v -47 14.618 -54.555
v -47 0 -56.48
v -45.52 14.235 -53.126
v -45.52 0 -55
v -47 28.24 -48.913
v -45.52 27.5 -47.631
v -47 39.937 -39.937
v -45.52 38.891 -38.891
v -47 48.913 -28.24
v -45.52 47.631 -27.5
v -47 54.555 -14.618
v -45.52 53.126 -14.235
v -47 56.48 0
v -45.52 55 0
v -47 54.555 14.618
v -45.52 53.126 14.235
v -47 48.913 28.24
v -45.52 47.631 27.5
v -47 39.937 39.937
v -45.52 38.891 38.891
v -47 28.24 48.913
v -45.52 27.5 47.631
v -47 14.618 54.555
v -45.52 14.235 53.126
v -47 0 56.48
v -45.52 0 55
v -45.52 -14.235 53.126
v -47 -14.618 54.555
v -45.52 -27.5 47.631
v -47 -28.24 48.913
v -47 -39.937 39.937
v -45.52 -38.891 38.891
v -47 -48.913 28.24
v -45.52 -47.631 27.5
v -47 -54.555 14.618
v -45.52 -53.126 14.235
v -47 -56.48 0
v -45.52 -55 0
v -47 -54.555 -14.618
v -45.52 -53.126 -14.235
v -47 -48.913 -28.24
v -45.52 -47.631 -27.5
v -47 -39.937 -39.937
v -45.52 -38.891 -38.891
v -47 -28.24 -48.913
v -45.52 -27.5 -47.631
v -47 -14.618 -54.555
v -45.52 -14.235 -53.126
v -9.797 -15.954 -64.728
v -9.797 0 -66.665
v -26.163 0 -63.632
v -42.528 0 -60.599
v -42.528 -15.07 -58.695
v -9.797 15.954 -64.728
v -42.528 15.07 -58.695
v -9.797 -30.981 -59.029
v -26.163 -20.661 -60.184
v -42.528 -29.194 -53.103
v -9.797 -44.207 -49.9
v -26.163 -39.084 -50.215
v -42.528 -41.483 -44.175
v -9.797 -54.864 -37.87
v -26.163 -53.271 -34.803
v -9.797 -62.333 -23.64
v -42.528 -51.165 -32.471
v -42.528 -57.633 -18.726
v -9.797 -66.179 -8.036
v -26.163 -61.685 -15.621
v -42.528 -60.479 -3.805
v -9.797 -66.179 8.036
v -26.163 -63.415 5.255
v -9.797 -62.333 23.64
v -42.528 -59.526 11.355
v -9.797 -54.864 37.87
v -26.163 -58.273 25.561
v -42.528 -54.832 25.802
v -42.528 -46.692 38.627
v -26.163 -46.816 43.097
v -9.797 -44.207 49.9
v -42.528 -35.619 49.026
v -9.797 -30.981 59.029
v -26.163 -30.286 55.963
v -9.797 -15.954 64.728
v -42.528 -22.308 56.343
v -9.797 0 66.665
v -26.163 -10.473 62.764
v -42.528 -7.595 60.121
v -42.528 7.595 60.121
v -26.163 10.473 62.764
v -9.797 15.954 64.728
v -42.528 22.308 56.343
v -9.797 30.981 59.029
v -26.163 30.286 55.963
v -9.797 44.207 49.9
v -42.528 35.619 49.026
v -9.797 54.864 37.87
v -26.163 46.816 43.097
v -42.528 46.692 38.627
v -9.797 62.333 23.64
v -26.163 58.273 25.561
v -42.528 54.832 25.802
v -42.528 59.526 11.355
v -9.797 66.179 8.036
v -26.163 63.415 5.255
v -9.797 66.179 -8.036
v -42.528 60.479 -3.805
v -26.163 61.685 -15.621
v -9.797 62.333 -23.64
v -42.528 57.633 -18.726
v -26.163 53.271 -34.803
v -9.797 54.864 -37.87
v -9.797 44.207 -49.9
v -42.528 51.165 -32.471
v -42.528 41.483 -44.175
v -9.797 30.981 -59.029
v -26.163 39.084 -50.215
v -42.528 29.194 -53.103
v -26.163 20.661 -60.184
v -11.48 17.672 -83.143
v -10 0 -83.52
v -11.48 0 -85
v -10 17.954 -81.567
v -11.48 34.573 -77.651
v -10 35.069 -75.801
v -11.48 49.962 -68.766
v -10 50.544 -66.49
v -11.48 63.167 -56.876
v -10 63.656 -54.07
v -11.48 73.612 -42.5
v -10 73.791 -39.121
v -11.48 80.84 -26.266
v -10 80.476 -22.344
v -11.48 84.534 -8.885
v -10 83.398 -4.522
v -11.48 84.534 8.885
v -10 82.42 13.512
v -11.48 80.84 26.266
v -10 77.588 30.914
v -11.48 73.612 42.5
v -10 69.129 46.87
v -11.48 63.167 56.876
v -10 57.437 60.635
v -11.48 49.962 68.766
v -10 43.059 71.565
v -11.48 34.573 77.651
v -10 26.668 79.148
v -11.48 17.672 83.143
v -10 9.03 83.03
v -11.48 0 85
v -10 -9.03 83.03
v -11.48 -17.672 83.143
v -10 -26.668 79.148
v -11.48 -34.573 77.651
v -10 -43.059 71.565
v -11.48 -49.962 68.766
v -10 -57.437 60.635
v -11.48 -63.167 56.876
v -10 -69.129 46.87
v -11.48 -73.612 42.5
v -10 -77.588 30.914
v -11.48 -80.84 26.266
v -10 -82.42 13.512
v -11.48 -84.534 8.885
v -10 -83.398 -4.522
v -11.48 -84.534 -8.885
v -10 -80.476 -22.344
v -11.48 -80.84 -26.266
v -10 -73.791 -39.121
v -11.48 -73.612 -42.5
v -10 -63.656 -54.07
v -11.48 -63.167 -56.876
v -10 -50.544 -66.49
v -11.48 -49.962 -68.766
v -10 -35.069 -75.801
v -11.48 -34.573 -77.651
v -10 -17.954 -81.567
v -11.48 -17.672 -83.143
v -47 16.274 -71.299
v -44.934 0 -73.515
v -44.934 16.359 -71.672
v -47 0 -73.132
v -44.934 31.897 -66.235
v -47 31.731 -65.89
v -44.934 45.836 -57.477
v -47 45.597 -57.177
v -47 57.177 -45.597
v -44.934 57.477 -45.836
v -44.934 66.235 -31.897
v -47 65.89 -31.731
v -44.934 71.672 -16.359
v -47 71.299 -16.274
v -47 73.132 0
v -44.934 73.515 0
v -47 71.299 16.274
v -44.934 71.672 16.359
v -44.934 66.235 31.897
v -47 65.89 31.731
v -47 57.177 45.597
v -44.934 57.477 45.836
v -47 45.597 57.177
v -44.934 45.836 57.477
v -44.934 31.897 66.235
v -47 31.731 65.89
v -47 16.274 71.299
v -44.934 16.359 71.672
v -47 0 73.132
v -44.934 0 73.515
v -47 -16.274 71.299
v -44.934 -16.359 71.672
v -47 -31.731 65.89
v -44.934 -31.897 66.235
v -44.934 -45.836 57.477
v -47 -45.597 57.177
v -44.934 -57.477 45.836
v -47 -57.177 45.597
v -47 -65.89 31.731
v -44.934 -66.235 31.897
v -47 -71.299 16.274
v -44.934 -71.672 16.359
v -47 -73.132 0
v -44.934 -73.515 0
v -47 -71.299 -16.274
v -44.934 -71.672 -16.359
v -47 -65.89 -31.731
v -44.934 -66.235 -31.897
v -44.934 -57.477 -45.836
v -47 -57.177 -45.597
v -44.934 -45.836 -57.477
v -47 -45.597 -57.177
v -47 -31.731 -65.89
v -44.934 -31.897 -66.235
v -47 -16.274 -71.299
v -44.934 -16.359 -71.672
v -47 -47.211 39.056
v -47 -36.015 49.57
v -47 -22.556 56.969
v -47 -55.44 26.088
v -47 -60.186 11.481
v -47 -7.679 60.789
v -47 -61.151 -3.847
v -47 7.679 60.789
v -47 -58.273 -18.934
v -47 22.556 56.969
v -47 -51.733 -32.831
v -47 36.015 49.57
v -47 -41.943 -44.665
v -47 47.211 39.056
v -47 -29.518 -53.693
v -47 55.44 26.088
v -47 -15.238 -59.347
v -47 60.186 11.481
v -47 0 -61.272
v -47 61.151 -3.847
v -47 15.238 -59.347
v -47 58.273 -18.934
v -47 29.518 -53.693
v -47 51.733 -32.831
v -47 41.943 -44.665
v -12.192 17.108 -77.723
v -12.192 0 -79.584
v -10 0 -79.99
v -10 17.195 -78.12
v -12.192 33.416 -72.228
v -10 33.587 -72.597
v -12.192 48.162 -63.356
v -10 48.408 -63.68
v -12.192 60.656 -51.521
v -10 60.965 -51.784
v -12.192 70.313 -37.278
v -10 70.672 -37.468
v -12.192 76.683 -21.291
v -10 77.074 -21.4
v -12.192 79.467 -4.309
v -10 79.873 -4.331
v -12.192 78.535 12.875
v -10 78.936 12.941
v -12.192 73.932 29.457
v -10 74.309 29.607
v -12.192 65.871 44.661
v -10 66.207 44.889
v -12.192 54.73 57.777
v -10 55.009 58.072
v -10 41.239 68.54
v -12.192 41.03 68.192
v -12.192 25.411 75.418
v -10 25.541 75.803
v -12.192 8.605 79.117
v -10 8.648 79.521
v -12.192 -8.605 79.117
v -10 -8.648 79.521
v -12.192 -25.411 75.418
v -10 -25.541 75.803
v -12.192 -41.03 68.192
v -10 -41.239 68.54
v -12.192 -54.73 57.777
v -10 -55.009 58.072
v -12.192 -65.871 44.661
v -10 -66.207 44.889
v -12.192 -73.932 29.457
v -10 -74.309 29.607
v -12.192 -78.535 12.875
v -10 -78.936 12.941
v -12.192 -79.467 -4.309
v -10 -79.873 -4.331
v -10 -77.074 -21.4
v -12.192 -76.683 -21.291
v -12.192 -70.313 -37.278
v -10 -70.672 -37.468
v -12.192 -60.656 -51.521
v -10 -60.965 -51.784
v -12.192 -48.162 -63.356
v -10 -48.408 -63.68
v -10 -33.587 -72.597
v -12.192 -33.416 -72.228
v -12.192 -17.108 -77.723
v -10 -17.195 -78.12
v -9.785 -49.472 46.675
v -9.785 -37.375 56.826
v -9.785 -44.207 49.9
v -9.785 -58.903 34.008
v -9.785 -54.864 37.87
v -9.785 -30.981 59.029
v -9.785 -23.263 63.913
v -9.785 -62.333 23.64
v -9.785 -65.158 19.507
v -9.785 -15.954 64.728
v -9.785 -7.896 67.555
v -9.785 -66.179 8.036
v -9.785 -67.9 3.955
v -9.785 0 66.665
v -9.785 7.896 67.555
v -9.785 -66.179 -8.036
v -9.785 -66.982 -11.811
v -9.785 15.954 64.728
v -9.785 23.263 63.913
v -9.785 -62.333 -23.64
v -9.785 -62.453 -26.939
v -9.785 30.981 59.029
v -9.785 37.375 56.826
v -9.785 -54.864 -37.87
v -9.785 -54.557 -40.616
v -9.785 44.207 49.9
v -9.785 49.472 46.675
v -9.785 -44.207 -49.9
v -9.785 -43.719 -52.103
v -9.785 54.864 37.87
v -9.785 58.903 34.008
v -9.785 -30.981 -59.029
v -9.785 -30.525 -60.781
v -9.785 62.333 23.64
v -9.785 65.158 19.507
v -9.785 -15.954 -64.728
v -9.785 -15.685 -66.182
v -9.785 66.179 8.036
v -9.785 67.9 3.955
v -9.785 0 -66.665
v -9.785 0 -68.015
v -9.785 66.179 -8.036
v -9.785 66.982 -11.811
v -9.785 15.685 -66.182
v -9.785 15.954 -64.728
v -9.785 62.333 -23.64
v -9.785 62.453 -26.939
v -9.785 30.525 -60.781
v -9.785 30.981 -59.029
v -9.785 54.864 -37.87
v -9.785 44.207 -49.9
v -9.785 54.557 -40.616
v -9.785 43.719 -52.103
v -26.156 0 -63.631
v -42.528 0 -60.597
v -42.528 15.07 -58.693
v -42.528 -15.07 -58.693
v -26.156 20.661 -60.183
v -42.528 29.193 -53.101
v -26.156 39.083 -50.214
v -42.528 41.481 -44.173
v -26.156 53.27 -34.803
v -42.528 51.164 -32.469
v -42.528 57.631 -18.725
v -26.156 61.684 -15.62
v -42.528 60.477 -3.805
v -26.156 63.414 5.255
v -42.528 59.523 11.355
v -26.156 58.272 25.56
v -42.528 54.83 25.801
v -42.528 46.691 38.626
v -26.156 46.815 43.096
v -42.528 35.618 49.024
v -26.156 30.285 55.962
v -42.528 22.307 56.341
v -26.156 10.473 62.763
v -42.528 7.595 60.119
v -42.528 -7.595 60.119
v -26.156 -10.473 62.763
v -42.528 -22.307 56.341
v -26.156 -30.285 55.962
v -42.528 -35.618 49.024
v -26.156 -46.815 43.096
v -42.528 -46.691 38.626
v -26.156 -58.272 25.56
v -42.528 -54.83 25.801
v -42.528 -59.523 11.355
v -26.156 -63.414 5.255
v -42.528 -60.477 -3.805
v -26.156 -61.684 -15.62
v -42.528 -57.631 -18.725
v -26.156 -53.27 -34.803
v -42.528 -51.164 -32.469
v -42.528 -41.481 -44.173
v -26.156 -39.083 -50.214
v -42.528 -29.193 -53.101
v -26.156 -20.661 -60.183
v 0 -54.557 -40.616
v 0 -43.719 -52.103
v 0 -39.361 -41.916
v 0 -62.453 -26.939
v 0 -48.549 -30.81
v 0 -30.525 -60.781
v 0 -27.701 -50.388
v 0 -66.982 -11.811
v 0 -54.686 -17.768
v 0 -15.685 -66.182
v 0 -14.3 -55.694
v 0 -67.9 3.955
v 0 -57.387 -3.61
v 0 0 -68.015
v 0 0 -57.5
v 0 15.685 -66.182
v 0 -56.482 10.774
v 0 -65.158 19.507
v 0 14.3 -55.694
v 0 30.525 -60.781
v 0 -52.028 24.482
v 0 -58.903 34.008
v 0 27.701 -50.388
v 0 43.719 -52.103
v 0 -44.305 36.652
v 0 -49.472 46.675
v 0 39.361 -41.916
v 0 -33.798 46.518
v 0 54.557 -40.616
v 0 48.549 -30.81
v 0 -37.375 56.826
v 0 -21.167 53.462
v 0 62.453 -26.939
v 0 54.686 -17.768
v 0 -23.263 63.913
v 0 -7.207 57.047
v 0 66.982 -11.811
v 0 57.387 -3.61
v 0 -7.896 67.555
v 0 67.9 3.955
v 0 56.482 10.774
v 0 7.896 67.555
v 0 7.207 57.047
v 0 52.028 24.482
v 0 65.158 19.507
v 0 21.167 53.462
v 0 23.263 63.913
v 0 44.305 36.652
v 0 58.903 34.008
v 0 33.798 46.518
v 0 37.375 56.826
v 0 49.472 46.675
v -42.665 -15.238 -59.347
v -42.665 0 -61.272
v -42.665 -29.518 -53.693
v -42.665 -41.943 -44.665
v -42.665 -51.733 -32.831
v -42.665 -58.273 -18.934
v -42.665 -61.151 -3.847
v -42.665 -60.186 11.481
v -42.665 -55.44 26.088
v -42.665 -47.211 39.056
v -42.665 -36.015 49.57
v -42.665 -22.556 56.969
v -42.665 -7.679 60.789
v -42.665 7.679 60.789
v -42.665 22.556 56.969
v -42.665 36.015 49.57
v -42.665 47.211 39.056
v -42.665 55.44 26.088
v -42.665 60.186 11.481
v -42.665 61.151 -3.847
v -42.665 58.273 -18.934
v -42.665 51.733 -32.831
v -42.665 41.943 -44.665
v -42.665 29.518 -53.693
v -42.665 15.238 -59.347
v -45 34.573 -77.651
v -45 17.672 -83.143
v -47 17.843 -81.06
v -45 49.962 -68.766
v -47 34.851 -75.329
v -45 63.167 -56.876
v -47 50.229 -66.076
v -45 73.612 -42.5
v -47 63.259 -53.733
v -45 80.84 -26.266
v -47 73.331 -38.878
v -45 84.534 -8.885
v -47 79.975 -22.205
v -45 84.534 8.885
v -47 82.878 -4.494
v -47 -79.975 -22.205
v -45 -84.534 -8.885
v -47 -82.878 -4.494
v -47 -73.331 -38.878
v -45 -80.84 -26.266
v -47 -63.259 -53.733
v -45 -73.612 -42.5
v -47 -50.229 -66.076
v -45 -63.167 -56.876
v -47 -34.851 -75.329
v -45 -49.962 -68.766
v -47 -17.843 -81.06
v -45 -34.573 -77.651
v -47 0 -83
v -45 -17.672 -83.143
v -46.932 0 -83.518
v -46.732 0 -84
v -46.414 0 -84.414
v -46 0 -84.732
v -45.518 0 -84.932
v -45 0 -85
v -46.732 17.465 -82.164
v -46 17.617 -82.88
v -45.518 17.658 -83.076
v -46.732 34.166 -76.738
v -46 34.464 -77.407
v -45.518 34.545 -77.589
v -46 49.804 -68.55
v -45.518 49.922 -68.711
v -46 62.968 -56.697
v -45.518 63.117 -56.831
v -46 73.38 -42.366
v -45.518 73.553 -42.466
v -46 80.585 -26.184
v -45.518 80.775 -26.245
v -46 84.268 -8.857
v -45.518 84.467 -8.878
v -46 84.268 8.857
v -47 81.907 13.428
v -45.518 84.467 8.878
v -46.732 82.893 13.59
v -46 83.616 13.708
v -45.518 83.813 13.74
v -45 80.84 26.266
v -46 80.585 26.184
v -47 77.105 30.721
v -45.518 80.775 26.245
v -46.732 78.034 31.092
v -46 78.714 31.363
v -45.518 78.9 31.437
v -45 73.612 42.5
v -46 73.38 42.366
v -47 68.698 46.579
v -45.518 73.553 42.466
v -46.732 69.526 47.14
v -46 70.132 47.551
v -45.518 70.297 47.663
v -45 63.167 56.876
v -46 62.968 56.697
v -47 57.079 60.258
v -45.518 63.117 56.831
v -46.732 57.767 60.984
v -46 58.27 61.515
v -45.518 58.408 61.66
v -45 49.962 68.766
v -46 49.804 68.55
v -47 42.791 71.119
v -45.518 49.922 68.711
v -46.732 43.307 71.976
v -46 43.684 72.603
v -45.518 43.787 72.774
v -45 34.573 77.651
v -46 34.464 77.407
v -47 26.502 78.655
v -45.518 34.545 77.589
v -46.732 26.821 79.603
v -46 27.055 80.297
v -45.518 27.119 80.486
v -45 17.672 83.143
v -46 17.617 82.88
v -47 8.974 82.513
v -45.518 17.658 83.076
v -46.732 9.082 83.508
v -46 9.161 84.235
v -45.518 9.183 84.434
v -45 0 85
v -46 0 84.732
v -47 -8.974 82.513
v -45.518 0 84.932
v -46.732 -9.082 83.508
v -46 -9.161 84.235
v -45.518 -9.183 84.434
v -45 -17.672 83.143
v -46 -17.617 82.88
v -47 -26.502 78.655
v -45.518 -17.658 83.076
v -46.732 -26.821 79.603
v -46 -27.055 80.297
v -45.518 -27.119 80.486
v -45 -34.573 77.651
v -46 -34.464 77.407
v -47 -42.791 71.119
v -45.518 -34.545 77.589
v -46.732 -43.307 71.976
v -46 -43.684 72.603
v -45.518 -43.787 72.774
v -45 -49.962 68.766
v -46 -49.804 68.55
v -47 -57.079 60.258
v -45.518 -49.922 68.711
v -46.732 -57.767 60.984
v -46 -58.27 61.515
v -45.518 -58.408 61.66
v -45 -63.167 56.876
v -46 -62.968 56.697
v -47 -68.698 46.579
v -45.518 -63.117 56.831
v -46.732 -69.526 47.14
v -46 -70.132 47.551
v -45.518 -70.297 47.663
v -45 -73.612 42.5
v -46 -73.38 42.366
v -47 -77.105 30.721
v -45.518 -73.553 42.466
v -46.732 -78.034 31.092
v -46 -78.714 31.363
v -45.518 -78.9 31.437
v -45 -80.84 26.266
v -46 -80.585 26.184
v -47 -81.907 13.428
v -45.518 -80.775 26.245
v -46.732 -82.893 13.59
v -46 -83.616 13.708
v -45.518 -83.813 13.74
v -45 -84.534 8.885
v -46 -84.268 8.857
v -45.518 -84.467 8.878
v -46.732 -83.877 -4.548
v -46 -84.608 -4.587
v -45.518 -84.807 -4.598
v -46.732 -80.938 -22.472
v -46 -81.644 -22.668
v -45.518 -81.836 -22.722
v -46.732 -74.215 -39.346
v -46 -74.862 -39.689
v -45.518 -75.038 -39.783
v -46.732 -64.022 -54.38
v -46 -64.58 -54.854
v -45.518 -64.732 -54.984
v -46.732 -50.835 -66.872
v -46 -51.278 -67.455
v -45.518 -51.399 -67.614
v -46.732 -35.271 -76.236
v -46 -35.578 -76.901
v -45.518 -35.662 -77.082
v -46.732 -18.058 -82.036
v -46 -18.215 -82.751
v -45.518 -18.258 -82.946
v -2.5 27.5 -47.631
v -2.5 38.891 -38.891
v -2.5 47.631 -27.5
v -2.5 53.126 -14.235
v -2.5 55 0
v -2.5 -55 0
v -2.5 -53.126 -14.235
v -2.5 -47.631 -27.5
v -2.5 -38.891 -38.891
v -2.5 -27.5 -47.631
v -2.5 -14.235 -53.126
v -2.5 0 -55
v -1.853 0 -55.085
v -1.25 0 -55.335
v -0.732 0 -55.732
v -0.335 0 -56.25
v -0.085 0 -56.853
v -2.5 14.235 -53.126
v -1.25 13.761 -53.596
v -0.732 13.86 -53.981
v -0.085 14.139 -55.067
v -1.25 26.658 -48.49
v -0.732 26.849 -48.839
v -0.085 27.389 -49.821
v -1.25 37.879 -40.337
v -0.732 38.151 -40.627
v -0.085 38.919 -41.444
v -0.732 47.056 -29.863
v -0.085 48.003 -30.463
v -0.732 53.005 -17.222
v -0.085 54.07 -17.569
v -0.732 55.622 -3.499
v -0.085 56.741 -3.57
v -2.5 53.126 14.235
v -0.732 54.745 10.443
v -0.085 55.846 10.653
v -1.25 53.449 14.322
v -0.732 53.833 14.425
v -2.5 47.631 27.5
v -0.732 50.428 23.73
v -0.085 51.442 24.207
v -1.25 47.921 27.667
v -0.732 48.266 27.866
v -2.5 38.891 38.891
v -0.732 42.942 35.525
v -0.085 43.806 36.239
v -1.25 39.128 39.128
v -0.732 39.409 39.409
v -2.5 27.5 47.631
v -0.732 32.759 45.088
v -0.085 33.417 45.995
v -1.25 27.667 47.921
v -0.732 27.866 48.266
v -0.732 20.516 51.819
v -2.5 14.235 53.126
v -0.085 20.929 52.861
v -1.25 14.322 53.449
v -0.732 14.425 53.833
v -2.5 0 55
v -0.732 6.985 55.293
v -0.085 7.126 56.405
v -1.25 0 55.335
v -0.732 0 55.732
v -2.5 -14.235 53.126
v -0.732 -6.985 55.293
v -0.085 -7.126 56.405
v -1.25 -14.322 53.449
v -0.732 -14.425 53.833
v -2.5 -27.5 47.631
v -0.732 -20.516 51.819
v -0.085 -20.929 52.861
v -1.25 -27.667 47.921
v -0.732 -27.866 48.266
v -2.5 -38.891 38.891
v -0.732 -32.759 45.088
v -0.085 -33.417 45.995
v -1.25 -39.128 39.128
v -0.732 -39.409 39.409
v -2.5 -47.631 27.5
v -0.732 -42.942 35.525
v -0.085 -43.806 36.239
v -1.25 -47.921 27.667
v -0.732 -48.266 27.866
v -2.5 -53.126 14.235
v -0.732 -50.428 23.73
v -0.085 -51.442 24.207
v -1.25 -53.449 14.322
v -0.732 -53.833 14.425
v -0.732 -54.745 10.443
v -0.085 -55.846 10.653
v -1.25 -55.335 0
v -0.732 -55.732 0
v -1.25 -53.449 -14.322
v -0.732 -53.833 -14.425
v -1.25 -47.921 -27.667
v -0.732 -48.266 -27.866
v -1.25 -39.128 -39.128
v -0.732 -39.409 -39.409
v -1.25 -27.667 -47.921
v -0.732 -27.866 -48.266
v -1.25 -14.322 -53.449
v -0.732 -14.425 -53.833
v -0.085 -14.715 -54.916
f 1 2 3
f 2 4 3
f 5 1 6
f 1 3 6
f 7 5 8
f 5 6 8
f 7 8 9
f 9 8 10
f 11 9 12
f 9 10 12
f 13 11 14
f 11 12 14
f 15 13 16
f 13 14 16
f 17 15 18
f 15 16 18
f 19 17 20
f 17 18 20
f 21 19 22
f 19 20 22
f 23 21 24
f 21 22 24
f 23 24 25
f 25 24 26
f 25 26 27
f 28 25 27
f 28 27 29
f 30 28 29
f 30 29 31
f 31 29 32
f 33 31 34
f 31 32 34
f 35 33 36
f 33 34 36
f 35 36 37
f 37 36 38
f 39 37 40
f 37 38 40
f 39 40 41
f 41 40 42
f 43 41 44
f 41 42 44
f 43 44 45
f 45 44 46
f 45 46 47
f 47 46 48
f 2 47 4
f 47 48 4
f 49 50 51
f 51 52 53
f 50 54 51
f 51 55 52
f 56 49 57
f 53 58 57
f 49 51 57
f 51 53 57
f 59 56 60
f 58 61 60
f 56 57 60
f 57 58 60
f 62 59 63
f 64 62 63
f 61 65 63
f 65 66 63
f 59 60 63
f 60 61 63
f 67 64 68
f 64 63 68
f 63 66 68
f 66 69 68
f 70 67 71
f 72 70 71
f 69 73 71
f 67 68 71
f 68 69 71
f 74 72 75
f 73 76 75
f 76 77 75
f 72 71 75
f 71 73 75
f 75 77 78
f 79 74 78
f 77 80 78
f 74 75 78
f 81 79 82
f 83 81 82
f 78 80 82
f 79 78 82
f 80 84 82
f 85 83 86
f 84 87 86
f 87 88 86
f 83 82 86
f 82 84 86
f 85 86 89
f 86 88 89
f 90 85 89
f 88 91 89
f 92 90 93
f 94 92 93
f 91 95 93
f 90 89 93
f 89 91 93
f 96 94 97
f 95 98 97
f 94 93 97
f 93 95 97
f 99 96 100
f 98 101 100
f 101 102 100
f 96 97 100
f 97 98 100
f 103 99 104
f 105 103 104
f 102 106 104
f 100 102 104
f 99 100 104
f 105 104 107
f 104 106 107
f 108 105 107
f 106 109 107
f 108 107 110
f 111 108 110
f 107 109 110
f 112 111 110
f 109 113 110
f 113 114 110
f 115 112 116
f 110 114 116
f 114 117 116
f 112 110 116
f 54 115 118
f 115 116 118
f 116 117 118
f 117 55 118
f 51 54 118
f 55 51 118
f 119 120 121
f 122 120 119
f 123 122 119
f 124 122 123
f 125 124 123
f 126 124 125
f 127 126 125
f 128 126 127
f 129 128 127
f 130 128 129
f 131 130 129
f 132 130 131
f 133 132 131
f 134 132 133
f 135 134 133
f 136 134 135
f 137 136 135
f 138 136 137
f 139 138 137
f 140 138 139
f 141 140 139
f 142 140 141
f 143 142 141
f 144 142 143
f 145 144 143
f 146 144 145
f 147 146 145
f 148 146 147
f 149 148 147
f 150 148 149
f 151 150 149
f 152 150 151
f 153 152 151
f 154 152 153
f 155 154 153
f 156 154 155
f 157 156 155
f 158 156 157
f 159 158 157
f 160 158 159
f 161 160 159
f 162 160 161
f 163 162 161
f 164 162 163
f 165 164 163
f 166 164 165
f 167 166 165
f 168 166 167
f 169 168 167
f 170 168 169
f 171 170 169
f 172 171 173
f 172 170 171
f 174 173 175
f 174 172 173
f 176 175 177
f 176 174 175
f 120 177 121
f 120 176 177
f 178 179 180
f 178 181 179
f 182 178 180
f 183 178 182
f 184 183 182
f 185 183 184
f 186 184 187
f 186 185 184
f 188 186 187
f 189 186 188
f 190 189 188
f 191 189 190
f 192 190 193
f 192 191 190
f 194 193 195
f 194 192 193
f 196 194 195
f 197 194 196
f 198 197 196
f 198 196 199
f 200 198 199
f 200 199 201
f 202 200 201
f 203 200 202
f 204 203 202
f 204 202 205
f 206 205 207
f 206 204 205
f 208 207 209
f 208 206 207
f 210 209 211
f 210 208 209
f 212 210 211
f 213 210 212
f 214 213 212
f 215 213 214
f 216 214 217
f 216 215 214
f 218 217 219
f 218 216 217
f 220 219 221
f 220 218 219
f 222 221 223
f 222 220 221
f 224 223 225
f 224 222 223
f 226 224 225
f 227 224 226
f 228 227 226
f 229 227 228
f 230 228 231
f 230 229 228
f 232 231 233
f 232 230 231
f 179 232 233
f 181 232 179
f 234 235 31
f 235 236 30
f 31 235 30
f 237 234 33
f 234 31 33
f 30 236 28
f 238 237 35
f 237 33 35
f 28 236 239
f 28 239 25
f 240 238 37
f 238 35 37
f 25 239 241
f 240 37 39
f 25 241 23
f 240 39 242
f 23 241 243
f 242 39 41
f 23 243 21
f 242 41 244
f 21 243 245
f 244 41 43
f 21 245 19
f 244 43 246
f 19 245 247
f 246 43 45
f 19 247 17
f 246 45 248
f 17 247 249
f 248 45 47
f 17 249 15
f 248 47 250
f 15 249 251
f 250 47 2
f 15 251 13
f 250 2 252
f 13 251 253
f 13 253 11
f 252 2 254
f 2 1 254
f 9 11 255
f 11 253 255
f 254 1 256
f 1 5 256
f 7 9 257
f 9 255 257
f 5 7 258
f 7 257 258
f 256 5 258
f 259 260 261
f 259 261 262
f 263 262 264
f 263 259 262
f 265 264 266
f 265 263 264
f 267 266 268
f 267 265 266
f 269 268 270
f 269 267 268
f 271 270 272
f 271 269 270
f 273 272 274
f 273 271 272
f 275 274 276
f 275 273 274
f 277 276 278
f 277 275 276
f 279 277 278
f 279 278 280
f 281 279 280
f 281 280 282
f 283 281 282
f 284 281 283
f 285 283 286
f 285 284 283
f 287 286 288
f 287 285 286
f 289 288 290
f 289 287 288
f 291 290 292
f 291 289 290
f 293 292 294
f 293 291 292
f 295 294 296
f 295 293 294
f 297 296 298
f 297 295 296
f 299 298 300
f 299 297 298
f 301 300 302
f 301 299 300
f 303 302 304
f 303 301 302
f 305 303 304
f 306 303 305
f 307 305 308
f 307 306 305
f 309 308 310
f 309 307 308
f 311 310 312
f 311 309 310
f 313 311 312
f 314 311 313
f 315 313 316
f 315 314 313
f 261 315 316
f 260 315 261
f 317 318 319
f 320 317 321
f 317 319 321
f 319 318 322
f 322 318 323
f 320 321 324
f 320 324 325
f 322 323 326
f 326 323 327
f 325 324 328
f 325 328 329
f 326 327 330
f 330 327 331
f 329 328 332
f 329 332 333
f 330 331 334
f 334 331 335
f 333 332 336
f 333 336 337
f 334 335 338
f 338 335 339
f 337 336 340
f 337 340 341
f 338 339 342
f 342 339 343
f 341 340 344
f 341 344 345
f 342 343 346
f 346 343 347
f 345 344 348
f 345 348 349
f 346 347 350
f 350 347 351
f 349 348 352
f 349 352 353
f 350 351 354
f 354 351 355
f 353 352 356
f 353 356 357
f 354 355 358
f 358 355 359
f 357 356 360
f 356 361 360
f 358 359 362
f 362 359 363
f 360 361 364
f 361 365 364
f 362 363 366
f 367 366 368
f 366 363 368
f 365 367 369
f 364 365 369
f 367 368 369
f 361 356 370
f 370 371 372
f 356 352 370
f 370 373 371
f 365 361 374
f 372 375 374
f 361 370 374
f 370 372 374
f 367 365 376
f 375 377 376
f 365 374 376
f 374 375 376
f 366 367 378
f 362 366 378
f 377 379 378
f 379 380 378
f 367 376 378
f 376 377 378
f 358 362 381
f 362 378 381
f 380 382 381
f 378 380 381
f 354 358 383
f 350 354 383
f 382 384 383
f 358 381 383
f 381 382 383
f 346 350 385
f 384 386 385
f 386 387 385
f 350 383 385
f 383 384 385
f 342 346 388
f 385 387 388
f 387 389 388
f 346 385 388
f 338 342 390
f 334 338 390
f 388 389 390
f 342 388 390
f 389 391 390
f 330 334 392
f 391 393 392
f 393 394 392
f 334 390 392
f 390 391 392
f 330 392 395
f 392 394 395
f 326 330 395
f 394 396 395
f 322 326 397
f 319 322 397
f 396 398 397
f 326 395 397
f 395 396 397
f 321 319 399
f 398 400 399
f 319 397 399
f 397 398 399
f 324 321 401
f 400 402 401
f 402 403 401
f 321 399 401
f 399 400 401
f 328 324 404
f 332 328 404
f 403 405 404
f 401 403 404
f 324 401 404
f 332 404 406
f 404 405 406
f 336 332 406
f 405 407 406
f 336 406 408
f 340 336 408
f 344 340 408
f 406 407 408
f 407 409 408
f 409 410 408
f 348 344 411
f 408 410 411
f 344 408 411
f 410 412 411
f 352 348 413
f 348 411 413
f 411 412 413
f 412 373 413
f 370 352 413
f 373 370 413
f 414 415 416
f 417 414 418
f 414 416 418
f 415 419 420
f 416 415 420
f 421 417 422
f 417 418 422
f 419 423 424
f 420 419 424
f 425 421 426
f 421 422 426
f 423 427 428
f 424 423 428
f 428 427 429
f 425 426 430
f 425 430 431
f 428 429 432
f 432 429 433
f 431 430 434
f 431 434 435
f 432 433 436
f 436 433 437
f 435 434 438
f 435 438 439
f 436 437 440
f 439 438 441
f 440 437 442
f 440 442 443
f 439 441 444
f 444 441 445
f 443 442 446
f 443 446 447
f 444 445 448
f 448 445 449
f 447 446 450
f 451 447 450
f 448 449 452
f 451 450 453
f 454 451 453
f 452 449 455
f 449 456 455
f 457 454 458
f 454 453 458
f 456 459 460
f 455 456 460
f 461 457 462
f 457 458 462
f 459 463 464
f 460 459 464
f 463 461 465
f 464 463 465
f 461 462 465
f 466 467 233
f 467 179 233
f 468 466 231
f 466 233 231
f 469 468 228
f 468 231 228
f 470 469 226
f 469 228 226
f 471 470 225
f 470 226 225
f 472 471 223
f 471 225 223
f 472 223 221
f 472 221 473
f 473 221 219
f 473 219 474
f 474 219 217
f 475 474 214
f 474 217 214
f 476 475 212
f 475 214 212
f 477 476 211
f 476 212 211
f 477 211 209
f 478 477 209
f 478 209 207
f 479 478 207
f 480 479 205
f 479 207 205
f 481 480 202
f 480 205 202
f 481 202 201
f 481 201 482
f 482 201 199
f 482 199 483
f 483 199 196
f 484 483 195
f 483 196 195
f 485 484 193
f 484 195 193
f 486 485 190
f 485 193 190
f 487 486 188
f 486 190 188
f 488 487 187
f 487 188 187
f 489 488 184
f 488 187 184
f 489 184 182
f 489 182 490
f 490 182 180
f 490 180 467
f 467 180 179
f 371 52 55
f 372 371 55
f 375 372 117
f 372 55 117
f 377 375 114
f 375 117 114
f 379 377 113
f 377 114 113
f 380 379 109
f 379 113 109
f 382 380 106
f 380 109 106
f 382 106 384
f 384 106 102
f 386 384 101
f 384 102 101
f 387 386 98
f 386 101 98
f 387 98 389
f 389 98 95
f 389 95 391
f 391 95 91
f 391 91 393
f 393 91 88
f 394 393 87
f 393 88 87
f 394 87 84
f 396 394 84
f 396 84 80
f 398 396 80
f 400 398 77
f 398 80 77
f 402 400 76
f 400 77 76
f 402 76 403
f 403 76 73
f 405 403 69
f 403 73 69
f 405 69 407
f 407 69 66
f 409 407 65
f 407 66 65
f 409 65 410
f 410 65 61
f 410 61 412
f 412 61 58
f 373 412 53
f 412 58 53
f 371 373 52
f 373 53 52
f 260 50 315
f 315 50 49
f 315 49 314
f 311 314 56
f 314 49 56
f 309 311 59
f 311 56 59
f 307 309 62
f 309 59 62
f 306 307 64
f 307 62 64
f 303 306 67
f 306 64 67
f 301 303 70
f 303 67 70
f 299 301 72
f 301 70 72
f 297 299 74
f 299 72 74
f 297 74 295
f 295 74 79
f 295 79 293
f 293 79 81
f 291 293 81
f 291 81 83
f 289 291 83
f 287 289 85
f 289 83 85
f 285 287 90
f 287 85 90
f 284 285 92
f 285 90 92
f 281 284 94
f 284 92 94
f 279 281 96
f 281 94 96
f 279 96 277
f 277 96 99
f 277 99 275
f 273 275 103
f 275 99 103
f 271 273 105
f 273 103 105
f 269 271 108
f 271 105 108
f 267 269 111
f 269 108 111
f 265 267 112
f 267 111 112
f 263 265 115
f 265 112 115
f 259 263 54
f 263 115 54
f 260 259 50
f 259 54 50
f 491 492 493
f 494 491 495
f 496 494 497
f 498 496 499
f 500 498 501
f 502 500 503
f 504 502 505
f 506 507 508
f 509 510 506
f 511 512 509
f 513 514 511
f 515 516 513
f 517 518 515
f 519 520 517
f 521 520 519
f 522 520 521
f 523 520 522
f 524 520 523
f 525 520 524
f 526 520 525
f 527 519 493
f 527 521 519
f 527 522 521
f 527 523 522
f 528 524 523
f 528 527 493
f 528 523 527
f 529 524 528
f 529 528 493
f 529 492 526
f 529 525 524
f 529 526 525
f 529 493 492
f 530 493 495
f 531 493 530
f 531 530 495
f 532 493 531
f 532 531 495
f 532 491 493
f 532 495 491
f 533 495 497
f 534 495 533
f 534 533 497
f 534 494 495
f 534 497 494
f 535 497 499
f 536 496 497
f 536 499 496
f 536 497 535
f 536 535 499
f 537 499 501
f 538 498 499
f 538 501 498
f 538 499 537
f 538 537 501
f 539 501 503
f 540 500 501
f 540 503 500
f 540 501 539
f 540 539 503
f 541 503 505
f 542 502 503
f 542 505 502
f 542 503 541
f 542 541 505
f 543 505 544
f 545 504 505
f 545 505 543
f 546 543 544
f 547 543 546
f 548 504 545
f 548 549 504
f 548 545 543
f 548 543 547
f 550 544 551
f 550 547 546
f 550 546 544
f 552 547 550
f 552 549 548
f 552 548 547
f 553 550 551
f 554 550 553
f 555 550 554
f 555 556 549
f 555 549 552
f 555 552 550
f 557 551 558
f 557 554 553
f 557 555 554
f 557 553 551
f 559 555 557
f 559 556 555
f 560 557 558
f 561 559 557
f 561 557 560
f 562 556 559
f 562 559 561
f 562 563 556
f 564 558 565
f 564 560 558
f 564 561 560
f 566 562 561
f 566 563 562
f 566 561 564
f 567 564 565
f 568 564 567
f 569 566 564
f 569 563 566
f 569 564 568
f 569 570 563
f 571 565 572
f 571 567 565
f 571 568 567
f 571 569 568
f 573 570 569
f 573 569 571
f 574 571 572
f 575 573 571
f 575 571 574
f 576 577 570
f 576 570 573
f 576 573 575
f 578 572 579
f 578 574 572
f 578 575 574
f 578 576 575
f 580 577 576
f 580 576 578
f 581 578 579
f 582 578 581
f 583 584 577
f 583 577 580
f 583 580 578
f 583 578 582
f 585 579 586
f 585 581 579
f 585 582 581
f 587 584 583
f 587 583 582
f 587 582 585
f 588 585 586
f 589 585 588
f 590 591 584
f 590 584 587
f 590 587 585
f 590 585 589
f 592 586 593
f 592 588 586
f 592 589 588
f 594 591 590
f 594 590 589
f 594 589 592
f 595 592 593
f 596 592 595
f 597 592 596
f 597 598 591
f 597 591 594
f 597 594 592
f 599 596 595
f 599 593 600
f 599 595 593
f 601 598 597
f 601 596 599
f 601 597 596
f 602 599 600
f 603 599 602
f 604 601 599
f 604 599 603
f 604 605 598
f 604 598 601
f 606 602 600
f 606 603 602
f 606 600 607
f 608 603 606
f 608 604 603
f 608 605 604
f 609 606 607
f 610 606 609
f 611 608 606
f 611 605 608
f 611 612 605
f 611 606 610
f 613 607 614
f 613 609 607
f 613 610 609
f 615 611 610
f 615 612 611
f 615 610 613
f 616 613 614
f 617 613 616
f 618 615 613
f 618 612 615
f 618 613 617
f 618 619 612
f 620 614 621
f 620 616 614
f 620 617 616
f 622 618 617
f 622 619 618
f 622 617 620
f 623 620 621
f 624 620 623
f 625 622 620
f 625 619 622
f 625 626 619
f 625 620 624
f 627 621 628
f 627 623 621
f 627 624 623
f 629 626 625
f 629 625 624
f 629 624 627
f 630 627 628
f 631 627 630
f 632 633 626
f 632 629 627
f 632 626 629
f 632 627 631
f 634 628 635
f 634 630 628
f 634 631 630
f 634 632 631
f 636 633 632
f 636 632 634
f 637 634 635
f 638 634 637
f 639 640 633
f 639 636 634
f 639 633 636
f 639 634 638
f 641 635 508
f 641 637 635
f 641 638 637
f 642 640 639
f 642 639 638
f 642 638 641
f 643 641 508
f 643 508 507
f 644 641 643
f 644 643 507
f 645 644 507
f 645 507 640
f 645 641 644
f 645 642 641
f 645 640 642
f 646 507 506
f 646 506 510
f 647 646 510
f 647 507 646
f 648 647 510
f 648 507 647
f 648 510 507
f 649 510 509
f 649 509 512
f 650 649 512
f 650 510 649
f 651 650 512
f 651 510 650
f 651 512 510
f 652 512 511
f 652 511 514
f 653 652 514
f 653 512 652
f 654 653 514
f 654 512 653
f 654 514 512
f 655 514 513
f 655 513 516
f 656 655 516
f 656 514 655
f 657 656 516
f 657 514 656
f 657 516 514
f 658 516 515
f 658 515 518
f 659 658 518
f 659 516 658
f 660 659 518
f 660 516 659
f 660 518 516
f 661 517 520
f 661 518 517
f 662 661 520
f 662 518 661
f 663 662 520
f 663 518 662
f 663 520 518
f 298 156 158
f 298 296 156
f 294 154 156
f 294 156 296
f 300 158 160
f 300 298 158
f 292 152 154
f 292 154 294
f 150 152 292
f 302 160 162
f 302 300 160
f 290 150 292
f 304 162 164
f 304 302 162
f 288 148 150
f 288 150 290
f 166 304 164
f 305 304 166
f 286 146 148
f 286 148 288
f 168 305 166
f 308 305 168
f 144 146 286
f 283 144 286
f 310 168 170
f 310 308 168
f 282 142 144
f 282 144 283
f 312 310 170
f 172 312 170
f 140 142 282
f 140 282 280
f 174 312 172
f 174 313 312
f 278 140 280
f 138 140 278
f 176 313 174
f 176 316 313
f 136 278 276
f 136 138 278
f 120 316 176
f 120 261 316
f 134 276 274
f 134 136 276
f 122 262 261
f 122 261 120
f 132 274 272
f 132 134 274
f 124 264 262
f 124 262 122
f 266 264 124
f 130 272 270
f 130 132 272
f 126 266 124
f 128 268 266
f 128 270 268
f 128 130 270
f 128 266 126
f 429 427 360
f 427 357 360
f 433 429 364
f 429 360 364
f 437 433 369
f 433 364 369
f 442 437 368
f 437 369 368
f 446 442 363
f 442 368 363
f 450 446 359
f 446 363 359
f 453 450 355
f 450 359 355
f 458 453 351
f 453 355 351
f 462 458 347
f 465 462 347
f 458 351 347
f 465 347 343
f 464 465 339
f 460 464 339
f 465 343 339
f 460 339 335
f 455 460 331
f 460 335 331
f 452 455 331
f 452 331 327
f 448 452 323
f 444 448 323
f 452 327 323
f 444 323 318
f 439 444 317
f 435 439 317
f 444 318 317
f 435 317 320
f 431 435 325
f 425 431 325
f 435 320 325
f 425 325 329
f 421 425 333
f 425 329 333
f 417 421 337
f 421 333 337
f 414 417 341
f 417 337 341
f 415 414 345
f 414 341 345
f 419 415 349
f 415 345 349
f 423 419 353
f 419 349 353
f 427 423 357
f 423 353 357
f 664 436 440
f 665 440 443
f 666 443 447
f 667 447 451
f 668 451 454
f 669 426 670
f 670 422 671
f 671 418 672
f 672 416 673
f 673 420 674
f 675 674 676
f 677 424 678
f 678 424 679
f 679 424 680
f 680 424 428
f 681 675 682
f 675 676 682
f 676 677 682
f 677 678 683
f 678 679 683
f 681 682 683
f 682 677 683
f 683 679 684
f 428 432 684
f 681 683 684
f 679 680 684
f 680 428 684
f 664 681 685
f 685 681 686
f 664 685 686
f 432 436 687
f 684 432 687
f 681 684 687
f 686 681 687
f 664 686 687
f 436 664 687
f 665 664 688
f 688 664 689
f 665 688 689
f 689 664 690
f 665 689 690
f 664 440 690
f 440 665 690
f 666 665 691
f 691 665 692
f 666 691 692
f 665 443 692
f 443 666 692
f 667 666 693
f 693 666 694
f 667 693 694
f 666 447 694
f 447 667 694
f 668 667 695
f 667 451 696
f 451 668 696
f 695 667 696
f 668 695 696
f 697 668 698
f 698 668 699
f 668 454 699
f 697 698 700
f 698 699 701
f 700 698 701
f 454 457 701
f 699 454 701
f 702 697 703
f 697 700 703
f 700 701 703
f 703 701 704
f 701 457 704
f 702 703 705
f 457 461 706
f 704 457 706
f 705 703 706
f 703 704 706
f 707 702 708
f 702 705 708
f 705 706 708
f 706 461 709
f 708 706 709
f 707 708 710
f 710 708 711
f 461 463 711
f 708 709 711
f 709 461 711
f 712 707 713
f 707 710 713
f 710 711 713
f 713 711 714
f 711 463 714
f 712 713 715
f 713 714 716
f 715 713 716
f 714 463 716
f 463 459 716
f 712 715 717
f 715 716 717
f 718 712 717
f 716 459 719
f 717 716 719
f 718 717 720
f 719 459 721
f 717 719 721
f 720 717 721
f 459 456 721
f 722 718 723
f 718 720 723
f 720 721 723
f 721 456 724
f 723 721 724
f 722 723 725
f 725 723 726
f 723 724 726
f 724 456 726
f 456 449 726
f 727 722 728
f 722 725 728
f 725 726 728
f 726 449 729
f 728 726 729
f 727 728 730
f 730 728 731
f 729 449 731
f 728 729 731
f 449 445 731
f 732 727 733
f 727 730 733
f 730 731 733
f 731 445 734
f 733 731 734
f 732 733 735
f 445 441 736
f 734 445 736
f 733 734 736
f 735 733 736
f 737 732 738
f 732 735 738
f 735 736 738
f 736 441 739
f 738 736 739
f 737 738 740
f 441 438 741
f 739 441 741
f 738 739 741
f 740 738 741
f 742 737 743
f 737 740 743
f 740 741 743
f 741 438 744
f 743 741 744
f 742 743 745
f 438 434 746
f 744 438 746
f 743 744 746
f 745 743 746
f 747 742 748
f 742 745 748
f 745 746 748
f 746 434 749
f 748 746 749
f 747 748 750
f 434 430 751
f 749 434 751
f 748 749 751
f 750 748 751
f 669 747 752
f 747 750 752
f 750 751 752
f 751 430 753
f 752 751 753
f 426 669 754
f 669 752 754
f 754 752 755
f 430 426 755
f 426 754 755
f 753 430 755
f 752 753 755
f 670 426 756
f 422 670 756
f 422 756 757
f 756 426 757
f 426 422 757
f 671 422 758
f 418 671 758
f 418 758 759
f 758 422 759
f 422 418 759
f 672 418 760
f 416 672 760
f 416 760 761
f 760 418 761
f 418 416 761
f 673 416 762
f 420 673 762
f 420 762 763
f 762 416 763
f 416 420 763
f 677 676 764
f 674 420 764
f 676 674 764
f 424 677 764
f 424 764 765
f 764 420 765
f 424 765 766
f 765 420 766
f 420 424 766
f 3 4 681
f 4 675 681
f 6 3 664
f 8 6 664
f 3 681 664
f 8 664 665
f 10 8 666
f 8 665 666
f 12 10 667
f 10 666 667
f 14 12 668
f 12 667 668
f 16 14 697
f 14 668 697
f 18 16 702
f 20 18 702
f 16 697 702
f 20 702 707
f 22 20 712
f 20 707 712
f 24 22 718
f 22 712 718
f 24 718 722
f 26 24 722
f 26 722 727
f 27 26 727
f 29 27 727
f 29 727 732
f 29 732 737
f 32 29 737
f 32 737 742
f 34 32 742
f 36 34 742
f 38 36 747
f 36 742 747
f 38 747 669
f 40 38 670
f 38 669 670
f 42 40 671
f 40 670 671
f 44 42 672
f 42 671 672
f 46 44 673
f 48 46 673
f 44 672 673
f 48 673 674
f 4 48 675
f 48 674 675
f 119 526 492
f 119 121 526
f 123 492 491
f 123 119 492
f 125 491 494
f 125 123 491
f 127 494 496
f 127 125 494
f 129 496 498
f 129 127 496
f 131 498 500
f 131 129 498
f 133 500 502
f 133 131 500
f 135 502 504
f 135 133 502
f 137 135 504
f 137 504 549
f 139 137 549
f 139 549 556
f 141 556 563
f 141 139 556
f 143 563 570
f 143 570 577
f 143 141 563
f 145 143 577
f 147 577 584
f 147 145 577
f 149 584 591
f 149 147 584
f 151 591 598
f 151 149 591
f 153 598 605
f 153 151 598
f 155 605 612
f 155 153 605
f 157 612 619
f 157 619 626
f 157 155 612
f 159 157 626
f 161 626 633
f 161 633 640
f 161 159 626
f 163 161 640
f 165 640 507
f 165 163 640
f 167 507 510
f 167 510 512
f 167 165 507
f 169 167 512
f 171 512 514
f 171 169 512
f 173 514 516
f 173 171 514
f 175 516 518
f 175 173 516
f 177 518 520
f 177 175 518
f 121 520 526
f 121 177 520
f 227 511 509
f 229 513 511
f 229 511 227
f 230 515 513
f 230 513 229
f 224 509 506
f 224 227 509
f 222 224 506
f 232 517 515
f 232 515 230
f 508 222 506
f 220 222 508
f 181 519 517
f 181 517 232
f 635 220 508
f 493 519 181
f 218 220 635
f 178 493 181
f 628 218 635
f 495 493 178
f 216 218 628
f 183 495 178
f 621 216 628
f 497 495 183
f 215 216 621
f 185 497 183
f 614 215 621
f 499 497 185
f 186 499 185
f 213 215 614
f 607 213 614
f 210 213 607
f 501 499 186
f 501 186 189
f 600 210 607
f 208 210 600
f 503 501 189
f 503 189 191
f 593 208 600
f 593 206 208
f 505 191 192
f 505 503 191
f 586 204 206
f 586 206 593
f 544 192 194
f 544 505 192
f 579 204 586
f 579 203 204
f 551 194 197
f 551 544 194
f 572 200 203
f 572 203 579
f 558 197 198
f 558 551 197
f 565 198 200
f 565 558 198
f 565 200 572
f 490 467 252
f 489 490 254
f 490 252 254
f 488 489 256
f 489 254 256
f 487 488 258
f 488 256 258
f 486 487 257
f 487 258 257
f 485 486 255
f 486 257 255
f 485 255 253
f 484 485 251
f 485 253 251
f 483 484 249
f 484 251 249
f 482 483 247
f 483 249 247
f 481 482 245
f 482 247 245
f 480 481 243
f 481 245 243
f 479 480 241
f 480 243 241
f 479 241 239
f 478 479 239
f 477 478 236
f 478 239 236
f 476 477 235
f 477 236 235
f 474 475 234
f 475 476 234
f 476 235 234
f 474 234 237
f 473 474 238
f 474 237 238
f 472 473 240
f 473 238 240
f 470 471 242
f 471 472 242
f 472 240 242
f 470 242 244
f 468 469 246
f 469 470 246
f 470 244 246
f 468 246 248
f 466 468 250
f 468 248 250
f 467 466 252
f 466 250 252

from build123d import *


with BuildPart() as part:
    # OutRacSke → OuterRace (revolve)
    with BuildSketch(Plane.XY):
        with BuildLine():
            Line((-10, 79.990044662), (-47, 73.1325))
            Line((-47, 73.1325), (-47, 83))
            ThreePointArc((-47, 83), (-46.414213562, 84.414213562), (-45, 85))
            Line((-45, 85), (-11.48, 85))
            Line((-11.48, 85), (-10, 83.52))
            Line((-10, 83.52), (-10, 79.990044662))
        make_face()
    revolve(axis=Axis((-42.5, 0, 0), (1, 0, 0)))

    # RolSimSke → RollersSimplified (revolve)
    with BuildSketch(Plane.XY):
        Polygon((-45, 73.87069398), (-12.257611578, 79.939136979), (-9.797431984, 66.665195727), (-42.539820406, 60.596752728), align=None)
    revolve(axis=Axis((0, 0, 0), (-1, 0, 0)))

    # InsRacSke → InnerRace (revolve)
    with BuildSketch(Plane.XY):
        with BuildLine():
            Line((-42.652623366, 61.271752727), (-47, 61.271752727))
            Line((-47, 61.271752727), (-47, 56.48))
            Line((-47, 56.48), (-45.52, 55))
            Line((-45.52, 55), (-2.5, 55))
            ThreePointArc((-2.5, 55), (-0.732233047, 55.732233047), (0, 57.5))
            Line((0, 57.5), (0, 68.015195726))
            Line((0, 68.015195726), (-9.785131089, 68.015195726))
            Line((-9.785131089, 68.015195726), (-9.785131089, 66.665195726))
            Line((-9.785131089, 66.665195726), (-42.527519511, 60.596752727))
            Line((-42.527519511, 60.596752727), (-42.652623366, 61.271752727))
        make_face()
    revolve(axis=Axis((-42.5, 0, 0), (1, 0, 0)))


solid = part.part
